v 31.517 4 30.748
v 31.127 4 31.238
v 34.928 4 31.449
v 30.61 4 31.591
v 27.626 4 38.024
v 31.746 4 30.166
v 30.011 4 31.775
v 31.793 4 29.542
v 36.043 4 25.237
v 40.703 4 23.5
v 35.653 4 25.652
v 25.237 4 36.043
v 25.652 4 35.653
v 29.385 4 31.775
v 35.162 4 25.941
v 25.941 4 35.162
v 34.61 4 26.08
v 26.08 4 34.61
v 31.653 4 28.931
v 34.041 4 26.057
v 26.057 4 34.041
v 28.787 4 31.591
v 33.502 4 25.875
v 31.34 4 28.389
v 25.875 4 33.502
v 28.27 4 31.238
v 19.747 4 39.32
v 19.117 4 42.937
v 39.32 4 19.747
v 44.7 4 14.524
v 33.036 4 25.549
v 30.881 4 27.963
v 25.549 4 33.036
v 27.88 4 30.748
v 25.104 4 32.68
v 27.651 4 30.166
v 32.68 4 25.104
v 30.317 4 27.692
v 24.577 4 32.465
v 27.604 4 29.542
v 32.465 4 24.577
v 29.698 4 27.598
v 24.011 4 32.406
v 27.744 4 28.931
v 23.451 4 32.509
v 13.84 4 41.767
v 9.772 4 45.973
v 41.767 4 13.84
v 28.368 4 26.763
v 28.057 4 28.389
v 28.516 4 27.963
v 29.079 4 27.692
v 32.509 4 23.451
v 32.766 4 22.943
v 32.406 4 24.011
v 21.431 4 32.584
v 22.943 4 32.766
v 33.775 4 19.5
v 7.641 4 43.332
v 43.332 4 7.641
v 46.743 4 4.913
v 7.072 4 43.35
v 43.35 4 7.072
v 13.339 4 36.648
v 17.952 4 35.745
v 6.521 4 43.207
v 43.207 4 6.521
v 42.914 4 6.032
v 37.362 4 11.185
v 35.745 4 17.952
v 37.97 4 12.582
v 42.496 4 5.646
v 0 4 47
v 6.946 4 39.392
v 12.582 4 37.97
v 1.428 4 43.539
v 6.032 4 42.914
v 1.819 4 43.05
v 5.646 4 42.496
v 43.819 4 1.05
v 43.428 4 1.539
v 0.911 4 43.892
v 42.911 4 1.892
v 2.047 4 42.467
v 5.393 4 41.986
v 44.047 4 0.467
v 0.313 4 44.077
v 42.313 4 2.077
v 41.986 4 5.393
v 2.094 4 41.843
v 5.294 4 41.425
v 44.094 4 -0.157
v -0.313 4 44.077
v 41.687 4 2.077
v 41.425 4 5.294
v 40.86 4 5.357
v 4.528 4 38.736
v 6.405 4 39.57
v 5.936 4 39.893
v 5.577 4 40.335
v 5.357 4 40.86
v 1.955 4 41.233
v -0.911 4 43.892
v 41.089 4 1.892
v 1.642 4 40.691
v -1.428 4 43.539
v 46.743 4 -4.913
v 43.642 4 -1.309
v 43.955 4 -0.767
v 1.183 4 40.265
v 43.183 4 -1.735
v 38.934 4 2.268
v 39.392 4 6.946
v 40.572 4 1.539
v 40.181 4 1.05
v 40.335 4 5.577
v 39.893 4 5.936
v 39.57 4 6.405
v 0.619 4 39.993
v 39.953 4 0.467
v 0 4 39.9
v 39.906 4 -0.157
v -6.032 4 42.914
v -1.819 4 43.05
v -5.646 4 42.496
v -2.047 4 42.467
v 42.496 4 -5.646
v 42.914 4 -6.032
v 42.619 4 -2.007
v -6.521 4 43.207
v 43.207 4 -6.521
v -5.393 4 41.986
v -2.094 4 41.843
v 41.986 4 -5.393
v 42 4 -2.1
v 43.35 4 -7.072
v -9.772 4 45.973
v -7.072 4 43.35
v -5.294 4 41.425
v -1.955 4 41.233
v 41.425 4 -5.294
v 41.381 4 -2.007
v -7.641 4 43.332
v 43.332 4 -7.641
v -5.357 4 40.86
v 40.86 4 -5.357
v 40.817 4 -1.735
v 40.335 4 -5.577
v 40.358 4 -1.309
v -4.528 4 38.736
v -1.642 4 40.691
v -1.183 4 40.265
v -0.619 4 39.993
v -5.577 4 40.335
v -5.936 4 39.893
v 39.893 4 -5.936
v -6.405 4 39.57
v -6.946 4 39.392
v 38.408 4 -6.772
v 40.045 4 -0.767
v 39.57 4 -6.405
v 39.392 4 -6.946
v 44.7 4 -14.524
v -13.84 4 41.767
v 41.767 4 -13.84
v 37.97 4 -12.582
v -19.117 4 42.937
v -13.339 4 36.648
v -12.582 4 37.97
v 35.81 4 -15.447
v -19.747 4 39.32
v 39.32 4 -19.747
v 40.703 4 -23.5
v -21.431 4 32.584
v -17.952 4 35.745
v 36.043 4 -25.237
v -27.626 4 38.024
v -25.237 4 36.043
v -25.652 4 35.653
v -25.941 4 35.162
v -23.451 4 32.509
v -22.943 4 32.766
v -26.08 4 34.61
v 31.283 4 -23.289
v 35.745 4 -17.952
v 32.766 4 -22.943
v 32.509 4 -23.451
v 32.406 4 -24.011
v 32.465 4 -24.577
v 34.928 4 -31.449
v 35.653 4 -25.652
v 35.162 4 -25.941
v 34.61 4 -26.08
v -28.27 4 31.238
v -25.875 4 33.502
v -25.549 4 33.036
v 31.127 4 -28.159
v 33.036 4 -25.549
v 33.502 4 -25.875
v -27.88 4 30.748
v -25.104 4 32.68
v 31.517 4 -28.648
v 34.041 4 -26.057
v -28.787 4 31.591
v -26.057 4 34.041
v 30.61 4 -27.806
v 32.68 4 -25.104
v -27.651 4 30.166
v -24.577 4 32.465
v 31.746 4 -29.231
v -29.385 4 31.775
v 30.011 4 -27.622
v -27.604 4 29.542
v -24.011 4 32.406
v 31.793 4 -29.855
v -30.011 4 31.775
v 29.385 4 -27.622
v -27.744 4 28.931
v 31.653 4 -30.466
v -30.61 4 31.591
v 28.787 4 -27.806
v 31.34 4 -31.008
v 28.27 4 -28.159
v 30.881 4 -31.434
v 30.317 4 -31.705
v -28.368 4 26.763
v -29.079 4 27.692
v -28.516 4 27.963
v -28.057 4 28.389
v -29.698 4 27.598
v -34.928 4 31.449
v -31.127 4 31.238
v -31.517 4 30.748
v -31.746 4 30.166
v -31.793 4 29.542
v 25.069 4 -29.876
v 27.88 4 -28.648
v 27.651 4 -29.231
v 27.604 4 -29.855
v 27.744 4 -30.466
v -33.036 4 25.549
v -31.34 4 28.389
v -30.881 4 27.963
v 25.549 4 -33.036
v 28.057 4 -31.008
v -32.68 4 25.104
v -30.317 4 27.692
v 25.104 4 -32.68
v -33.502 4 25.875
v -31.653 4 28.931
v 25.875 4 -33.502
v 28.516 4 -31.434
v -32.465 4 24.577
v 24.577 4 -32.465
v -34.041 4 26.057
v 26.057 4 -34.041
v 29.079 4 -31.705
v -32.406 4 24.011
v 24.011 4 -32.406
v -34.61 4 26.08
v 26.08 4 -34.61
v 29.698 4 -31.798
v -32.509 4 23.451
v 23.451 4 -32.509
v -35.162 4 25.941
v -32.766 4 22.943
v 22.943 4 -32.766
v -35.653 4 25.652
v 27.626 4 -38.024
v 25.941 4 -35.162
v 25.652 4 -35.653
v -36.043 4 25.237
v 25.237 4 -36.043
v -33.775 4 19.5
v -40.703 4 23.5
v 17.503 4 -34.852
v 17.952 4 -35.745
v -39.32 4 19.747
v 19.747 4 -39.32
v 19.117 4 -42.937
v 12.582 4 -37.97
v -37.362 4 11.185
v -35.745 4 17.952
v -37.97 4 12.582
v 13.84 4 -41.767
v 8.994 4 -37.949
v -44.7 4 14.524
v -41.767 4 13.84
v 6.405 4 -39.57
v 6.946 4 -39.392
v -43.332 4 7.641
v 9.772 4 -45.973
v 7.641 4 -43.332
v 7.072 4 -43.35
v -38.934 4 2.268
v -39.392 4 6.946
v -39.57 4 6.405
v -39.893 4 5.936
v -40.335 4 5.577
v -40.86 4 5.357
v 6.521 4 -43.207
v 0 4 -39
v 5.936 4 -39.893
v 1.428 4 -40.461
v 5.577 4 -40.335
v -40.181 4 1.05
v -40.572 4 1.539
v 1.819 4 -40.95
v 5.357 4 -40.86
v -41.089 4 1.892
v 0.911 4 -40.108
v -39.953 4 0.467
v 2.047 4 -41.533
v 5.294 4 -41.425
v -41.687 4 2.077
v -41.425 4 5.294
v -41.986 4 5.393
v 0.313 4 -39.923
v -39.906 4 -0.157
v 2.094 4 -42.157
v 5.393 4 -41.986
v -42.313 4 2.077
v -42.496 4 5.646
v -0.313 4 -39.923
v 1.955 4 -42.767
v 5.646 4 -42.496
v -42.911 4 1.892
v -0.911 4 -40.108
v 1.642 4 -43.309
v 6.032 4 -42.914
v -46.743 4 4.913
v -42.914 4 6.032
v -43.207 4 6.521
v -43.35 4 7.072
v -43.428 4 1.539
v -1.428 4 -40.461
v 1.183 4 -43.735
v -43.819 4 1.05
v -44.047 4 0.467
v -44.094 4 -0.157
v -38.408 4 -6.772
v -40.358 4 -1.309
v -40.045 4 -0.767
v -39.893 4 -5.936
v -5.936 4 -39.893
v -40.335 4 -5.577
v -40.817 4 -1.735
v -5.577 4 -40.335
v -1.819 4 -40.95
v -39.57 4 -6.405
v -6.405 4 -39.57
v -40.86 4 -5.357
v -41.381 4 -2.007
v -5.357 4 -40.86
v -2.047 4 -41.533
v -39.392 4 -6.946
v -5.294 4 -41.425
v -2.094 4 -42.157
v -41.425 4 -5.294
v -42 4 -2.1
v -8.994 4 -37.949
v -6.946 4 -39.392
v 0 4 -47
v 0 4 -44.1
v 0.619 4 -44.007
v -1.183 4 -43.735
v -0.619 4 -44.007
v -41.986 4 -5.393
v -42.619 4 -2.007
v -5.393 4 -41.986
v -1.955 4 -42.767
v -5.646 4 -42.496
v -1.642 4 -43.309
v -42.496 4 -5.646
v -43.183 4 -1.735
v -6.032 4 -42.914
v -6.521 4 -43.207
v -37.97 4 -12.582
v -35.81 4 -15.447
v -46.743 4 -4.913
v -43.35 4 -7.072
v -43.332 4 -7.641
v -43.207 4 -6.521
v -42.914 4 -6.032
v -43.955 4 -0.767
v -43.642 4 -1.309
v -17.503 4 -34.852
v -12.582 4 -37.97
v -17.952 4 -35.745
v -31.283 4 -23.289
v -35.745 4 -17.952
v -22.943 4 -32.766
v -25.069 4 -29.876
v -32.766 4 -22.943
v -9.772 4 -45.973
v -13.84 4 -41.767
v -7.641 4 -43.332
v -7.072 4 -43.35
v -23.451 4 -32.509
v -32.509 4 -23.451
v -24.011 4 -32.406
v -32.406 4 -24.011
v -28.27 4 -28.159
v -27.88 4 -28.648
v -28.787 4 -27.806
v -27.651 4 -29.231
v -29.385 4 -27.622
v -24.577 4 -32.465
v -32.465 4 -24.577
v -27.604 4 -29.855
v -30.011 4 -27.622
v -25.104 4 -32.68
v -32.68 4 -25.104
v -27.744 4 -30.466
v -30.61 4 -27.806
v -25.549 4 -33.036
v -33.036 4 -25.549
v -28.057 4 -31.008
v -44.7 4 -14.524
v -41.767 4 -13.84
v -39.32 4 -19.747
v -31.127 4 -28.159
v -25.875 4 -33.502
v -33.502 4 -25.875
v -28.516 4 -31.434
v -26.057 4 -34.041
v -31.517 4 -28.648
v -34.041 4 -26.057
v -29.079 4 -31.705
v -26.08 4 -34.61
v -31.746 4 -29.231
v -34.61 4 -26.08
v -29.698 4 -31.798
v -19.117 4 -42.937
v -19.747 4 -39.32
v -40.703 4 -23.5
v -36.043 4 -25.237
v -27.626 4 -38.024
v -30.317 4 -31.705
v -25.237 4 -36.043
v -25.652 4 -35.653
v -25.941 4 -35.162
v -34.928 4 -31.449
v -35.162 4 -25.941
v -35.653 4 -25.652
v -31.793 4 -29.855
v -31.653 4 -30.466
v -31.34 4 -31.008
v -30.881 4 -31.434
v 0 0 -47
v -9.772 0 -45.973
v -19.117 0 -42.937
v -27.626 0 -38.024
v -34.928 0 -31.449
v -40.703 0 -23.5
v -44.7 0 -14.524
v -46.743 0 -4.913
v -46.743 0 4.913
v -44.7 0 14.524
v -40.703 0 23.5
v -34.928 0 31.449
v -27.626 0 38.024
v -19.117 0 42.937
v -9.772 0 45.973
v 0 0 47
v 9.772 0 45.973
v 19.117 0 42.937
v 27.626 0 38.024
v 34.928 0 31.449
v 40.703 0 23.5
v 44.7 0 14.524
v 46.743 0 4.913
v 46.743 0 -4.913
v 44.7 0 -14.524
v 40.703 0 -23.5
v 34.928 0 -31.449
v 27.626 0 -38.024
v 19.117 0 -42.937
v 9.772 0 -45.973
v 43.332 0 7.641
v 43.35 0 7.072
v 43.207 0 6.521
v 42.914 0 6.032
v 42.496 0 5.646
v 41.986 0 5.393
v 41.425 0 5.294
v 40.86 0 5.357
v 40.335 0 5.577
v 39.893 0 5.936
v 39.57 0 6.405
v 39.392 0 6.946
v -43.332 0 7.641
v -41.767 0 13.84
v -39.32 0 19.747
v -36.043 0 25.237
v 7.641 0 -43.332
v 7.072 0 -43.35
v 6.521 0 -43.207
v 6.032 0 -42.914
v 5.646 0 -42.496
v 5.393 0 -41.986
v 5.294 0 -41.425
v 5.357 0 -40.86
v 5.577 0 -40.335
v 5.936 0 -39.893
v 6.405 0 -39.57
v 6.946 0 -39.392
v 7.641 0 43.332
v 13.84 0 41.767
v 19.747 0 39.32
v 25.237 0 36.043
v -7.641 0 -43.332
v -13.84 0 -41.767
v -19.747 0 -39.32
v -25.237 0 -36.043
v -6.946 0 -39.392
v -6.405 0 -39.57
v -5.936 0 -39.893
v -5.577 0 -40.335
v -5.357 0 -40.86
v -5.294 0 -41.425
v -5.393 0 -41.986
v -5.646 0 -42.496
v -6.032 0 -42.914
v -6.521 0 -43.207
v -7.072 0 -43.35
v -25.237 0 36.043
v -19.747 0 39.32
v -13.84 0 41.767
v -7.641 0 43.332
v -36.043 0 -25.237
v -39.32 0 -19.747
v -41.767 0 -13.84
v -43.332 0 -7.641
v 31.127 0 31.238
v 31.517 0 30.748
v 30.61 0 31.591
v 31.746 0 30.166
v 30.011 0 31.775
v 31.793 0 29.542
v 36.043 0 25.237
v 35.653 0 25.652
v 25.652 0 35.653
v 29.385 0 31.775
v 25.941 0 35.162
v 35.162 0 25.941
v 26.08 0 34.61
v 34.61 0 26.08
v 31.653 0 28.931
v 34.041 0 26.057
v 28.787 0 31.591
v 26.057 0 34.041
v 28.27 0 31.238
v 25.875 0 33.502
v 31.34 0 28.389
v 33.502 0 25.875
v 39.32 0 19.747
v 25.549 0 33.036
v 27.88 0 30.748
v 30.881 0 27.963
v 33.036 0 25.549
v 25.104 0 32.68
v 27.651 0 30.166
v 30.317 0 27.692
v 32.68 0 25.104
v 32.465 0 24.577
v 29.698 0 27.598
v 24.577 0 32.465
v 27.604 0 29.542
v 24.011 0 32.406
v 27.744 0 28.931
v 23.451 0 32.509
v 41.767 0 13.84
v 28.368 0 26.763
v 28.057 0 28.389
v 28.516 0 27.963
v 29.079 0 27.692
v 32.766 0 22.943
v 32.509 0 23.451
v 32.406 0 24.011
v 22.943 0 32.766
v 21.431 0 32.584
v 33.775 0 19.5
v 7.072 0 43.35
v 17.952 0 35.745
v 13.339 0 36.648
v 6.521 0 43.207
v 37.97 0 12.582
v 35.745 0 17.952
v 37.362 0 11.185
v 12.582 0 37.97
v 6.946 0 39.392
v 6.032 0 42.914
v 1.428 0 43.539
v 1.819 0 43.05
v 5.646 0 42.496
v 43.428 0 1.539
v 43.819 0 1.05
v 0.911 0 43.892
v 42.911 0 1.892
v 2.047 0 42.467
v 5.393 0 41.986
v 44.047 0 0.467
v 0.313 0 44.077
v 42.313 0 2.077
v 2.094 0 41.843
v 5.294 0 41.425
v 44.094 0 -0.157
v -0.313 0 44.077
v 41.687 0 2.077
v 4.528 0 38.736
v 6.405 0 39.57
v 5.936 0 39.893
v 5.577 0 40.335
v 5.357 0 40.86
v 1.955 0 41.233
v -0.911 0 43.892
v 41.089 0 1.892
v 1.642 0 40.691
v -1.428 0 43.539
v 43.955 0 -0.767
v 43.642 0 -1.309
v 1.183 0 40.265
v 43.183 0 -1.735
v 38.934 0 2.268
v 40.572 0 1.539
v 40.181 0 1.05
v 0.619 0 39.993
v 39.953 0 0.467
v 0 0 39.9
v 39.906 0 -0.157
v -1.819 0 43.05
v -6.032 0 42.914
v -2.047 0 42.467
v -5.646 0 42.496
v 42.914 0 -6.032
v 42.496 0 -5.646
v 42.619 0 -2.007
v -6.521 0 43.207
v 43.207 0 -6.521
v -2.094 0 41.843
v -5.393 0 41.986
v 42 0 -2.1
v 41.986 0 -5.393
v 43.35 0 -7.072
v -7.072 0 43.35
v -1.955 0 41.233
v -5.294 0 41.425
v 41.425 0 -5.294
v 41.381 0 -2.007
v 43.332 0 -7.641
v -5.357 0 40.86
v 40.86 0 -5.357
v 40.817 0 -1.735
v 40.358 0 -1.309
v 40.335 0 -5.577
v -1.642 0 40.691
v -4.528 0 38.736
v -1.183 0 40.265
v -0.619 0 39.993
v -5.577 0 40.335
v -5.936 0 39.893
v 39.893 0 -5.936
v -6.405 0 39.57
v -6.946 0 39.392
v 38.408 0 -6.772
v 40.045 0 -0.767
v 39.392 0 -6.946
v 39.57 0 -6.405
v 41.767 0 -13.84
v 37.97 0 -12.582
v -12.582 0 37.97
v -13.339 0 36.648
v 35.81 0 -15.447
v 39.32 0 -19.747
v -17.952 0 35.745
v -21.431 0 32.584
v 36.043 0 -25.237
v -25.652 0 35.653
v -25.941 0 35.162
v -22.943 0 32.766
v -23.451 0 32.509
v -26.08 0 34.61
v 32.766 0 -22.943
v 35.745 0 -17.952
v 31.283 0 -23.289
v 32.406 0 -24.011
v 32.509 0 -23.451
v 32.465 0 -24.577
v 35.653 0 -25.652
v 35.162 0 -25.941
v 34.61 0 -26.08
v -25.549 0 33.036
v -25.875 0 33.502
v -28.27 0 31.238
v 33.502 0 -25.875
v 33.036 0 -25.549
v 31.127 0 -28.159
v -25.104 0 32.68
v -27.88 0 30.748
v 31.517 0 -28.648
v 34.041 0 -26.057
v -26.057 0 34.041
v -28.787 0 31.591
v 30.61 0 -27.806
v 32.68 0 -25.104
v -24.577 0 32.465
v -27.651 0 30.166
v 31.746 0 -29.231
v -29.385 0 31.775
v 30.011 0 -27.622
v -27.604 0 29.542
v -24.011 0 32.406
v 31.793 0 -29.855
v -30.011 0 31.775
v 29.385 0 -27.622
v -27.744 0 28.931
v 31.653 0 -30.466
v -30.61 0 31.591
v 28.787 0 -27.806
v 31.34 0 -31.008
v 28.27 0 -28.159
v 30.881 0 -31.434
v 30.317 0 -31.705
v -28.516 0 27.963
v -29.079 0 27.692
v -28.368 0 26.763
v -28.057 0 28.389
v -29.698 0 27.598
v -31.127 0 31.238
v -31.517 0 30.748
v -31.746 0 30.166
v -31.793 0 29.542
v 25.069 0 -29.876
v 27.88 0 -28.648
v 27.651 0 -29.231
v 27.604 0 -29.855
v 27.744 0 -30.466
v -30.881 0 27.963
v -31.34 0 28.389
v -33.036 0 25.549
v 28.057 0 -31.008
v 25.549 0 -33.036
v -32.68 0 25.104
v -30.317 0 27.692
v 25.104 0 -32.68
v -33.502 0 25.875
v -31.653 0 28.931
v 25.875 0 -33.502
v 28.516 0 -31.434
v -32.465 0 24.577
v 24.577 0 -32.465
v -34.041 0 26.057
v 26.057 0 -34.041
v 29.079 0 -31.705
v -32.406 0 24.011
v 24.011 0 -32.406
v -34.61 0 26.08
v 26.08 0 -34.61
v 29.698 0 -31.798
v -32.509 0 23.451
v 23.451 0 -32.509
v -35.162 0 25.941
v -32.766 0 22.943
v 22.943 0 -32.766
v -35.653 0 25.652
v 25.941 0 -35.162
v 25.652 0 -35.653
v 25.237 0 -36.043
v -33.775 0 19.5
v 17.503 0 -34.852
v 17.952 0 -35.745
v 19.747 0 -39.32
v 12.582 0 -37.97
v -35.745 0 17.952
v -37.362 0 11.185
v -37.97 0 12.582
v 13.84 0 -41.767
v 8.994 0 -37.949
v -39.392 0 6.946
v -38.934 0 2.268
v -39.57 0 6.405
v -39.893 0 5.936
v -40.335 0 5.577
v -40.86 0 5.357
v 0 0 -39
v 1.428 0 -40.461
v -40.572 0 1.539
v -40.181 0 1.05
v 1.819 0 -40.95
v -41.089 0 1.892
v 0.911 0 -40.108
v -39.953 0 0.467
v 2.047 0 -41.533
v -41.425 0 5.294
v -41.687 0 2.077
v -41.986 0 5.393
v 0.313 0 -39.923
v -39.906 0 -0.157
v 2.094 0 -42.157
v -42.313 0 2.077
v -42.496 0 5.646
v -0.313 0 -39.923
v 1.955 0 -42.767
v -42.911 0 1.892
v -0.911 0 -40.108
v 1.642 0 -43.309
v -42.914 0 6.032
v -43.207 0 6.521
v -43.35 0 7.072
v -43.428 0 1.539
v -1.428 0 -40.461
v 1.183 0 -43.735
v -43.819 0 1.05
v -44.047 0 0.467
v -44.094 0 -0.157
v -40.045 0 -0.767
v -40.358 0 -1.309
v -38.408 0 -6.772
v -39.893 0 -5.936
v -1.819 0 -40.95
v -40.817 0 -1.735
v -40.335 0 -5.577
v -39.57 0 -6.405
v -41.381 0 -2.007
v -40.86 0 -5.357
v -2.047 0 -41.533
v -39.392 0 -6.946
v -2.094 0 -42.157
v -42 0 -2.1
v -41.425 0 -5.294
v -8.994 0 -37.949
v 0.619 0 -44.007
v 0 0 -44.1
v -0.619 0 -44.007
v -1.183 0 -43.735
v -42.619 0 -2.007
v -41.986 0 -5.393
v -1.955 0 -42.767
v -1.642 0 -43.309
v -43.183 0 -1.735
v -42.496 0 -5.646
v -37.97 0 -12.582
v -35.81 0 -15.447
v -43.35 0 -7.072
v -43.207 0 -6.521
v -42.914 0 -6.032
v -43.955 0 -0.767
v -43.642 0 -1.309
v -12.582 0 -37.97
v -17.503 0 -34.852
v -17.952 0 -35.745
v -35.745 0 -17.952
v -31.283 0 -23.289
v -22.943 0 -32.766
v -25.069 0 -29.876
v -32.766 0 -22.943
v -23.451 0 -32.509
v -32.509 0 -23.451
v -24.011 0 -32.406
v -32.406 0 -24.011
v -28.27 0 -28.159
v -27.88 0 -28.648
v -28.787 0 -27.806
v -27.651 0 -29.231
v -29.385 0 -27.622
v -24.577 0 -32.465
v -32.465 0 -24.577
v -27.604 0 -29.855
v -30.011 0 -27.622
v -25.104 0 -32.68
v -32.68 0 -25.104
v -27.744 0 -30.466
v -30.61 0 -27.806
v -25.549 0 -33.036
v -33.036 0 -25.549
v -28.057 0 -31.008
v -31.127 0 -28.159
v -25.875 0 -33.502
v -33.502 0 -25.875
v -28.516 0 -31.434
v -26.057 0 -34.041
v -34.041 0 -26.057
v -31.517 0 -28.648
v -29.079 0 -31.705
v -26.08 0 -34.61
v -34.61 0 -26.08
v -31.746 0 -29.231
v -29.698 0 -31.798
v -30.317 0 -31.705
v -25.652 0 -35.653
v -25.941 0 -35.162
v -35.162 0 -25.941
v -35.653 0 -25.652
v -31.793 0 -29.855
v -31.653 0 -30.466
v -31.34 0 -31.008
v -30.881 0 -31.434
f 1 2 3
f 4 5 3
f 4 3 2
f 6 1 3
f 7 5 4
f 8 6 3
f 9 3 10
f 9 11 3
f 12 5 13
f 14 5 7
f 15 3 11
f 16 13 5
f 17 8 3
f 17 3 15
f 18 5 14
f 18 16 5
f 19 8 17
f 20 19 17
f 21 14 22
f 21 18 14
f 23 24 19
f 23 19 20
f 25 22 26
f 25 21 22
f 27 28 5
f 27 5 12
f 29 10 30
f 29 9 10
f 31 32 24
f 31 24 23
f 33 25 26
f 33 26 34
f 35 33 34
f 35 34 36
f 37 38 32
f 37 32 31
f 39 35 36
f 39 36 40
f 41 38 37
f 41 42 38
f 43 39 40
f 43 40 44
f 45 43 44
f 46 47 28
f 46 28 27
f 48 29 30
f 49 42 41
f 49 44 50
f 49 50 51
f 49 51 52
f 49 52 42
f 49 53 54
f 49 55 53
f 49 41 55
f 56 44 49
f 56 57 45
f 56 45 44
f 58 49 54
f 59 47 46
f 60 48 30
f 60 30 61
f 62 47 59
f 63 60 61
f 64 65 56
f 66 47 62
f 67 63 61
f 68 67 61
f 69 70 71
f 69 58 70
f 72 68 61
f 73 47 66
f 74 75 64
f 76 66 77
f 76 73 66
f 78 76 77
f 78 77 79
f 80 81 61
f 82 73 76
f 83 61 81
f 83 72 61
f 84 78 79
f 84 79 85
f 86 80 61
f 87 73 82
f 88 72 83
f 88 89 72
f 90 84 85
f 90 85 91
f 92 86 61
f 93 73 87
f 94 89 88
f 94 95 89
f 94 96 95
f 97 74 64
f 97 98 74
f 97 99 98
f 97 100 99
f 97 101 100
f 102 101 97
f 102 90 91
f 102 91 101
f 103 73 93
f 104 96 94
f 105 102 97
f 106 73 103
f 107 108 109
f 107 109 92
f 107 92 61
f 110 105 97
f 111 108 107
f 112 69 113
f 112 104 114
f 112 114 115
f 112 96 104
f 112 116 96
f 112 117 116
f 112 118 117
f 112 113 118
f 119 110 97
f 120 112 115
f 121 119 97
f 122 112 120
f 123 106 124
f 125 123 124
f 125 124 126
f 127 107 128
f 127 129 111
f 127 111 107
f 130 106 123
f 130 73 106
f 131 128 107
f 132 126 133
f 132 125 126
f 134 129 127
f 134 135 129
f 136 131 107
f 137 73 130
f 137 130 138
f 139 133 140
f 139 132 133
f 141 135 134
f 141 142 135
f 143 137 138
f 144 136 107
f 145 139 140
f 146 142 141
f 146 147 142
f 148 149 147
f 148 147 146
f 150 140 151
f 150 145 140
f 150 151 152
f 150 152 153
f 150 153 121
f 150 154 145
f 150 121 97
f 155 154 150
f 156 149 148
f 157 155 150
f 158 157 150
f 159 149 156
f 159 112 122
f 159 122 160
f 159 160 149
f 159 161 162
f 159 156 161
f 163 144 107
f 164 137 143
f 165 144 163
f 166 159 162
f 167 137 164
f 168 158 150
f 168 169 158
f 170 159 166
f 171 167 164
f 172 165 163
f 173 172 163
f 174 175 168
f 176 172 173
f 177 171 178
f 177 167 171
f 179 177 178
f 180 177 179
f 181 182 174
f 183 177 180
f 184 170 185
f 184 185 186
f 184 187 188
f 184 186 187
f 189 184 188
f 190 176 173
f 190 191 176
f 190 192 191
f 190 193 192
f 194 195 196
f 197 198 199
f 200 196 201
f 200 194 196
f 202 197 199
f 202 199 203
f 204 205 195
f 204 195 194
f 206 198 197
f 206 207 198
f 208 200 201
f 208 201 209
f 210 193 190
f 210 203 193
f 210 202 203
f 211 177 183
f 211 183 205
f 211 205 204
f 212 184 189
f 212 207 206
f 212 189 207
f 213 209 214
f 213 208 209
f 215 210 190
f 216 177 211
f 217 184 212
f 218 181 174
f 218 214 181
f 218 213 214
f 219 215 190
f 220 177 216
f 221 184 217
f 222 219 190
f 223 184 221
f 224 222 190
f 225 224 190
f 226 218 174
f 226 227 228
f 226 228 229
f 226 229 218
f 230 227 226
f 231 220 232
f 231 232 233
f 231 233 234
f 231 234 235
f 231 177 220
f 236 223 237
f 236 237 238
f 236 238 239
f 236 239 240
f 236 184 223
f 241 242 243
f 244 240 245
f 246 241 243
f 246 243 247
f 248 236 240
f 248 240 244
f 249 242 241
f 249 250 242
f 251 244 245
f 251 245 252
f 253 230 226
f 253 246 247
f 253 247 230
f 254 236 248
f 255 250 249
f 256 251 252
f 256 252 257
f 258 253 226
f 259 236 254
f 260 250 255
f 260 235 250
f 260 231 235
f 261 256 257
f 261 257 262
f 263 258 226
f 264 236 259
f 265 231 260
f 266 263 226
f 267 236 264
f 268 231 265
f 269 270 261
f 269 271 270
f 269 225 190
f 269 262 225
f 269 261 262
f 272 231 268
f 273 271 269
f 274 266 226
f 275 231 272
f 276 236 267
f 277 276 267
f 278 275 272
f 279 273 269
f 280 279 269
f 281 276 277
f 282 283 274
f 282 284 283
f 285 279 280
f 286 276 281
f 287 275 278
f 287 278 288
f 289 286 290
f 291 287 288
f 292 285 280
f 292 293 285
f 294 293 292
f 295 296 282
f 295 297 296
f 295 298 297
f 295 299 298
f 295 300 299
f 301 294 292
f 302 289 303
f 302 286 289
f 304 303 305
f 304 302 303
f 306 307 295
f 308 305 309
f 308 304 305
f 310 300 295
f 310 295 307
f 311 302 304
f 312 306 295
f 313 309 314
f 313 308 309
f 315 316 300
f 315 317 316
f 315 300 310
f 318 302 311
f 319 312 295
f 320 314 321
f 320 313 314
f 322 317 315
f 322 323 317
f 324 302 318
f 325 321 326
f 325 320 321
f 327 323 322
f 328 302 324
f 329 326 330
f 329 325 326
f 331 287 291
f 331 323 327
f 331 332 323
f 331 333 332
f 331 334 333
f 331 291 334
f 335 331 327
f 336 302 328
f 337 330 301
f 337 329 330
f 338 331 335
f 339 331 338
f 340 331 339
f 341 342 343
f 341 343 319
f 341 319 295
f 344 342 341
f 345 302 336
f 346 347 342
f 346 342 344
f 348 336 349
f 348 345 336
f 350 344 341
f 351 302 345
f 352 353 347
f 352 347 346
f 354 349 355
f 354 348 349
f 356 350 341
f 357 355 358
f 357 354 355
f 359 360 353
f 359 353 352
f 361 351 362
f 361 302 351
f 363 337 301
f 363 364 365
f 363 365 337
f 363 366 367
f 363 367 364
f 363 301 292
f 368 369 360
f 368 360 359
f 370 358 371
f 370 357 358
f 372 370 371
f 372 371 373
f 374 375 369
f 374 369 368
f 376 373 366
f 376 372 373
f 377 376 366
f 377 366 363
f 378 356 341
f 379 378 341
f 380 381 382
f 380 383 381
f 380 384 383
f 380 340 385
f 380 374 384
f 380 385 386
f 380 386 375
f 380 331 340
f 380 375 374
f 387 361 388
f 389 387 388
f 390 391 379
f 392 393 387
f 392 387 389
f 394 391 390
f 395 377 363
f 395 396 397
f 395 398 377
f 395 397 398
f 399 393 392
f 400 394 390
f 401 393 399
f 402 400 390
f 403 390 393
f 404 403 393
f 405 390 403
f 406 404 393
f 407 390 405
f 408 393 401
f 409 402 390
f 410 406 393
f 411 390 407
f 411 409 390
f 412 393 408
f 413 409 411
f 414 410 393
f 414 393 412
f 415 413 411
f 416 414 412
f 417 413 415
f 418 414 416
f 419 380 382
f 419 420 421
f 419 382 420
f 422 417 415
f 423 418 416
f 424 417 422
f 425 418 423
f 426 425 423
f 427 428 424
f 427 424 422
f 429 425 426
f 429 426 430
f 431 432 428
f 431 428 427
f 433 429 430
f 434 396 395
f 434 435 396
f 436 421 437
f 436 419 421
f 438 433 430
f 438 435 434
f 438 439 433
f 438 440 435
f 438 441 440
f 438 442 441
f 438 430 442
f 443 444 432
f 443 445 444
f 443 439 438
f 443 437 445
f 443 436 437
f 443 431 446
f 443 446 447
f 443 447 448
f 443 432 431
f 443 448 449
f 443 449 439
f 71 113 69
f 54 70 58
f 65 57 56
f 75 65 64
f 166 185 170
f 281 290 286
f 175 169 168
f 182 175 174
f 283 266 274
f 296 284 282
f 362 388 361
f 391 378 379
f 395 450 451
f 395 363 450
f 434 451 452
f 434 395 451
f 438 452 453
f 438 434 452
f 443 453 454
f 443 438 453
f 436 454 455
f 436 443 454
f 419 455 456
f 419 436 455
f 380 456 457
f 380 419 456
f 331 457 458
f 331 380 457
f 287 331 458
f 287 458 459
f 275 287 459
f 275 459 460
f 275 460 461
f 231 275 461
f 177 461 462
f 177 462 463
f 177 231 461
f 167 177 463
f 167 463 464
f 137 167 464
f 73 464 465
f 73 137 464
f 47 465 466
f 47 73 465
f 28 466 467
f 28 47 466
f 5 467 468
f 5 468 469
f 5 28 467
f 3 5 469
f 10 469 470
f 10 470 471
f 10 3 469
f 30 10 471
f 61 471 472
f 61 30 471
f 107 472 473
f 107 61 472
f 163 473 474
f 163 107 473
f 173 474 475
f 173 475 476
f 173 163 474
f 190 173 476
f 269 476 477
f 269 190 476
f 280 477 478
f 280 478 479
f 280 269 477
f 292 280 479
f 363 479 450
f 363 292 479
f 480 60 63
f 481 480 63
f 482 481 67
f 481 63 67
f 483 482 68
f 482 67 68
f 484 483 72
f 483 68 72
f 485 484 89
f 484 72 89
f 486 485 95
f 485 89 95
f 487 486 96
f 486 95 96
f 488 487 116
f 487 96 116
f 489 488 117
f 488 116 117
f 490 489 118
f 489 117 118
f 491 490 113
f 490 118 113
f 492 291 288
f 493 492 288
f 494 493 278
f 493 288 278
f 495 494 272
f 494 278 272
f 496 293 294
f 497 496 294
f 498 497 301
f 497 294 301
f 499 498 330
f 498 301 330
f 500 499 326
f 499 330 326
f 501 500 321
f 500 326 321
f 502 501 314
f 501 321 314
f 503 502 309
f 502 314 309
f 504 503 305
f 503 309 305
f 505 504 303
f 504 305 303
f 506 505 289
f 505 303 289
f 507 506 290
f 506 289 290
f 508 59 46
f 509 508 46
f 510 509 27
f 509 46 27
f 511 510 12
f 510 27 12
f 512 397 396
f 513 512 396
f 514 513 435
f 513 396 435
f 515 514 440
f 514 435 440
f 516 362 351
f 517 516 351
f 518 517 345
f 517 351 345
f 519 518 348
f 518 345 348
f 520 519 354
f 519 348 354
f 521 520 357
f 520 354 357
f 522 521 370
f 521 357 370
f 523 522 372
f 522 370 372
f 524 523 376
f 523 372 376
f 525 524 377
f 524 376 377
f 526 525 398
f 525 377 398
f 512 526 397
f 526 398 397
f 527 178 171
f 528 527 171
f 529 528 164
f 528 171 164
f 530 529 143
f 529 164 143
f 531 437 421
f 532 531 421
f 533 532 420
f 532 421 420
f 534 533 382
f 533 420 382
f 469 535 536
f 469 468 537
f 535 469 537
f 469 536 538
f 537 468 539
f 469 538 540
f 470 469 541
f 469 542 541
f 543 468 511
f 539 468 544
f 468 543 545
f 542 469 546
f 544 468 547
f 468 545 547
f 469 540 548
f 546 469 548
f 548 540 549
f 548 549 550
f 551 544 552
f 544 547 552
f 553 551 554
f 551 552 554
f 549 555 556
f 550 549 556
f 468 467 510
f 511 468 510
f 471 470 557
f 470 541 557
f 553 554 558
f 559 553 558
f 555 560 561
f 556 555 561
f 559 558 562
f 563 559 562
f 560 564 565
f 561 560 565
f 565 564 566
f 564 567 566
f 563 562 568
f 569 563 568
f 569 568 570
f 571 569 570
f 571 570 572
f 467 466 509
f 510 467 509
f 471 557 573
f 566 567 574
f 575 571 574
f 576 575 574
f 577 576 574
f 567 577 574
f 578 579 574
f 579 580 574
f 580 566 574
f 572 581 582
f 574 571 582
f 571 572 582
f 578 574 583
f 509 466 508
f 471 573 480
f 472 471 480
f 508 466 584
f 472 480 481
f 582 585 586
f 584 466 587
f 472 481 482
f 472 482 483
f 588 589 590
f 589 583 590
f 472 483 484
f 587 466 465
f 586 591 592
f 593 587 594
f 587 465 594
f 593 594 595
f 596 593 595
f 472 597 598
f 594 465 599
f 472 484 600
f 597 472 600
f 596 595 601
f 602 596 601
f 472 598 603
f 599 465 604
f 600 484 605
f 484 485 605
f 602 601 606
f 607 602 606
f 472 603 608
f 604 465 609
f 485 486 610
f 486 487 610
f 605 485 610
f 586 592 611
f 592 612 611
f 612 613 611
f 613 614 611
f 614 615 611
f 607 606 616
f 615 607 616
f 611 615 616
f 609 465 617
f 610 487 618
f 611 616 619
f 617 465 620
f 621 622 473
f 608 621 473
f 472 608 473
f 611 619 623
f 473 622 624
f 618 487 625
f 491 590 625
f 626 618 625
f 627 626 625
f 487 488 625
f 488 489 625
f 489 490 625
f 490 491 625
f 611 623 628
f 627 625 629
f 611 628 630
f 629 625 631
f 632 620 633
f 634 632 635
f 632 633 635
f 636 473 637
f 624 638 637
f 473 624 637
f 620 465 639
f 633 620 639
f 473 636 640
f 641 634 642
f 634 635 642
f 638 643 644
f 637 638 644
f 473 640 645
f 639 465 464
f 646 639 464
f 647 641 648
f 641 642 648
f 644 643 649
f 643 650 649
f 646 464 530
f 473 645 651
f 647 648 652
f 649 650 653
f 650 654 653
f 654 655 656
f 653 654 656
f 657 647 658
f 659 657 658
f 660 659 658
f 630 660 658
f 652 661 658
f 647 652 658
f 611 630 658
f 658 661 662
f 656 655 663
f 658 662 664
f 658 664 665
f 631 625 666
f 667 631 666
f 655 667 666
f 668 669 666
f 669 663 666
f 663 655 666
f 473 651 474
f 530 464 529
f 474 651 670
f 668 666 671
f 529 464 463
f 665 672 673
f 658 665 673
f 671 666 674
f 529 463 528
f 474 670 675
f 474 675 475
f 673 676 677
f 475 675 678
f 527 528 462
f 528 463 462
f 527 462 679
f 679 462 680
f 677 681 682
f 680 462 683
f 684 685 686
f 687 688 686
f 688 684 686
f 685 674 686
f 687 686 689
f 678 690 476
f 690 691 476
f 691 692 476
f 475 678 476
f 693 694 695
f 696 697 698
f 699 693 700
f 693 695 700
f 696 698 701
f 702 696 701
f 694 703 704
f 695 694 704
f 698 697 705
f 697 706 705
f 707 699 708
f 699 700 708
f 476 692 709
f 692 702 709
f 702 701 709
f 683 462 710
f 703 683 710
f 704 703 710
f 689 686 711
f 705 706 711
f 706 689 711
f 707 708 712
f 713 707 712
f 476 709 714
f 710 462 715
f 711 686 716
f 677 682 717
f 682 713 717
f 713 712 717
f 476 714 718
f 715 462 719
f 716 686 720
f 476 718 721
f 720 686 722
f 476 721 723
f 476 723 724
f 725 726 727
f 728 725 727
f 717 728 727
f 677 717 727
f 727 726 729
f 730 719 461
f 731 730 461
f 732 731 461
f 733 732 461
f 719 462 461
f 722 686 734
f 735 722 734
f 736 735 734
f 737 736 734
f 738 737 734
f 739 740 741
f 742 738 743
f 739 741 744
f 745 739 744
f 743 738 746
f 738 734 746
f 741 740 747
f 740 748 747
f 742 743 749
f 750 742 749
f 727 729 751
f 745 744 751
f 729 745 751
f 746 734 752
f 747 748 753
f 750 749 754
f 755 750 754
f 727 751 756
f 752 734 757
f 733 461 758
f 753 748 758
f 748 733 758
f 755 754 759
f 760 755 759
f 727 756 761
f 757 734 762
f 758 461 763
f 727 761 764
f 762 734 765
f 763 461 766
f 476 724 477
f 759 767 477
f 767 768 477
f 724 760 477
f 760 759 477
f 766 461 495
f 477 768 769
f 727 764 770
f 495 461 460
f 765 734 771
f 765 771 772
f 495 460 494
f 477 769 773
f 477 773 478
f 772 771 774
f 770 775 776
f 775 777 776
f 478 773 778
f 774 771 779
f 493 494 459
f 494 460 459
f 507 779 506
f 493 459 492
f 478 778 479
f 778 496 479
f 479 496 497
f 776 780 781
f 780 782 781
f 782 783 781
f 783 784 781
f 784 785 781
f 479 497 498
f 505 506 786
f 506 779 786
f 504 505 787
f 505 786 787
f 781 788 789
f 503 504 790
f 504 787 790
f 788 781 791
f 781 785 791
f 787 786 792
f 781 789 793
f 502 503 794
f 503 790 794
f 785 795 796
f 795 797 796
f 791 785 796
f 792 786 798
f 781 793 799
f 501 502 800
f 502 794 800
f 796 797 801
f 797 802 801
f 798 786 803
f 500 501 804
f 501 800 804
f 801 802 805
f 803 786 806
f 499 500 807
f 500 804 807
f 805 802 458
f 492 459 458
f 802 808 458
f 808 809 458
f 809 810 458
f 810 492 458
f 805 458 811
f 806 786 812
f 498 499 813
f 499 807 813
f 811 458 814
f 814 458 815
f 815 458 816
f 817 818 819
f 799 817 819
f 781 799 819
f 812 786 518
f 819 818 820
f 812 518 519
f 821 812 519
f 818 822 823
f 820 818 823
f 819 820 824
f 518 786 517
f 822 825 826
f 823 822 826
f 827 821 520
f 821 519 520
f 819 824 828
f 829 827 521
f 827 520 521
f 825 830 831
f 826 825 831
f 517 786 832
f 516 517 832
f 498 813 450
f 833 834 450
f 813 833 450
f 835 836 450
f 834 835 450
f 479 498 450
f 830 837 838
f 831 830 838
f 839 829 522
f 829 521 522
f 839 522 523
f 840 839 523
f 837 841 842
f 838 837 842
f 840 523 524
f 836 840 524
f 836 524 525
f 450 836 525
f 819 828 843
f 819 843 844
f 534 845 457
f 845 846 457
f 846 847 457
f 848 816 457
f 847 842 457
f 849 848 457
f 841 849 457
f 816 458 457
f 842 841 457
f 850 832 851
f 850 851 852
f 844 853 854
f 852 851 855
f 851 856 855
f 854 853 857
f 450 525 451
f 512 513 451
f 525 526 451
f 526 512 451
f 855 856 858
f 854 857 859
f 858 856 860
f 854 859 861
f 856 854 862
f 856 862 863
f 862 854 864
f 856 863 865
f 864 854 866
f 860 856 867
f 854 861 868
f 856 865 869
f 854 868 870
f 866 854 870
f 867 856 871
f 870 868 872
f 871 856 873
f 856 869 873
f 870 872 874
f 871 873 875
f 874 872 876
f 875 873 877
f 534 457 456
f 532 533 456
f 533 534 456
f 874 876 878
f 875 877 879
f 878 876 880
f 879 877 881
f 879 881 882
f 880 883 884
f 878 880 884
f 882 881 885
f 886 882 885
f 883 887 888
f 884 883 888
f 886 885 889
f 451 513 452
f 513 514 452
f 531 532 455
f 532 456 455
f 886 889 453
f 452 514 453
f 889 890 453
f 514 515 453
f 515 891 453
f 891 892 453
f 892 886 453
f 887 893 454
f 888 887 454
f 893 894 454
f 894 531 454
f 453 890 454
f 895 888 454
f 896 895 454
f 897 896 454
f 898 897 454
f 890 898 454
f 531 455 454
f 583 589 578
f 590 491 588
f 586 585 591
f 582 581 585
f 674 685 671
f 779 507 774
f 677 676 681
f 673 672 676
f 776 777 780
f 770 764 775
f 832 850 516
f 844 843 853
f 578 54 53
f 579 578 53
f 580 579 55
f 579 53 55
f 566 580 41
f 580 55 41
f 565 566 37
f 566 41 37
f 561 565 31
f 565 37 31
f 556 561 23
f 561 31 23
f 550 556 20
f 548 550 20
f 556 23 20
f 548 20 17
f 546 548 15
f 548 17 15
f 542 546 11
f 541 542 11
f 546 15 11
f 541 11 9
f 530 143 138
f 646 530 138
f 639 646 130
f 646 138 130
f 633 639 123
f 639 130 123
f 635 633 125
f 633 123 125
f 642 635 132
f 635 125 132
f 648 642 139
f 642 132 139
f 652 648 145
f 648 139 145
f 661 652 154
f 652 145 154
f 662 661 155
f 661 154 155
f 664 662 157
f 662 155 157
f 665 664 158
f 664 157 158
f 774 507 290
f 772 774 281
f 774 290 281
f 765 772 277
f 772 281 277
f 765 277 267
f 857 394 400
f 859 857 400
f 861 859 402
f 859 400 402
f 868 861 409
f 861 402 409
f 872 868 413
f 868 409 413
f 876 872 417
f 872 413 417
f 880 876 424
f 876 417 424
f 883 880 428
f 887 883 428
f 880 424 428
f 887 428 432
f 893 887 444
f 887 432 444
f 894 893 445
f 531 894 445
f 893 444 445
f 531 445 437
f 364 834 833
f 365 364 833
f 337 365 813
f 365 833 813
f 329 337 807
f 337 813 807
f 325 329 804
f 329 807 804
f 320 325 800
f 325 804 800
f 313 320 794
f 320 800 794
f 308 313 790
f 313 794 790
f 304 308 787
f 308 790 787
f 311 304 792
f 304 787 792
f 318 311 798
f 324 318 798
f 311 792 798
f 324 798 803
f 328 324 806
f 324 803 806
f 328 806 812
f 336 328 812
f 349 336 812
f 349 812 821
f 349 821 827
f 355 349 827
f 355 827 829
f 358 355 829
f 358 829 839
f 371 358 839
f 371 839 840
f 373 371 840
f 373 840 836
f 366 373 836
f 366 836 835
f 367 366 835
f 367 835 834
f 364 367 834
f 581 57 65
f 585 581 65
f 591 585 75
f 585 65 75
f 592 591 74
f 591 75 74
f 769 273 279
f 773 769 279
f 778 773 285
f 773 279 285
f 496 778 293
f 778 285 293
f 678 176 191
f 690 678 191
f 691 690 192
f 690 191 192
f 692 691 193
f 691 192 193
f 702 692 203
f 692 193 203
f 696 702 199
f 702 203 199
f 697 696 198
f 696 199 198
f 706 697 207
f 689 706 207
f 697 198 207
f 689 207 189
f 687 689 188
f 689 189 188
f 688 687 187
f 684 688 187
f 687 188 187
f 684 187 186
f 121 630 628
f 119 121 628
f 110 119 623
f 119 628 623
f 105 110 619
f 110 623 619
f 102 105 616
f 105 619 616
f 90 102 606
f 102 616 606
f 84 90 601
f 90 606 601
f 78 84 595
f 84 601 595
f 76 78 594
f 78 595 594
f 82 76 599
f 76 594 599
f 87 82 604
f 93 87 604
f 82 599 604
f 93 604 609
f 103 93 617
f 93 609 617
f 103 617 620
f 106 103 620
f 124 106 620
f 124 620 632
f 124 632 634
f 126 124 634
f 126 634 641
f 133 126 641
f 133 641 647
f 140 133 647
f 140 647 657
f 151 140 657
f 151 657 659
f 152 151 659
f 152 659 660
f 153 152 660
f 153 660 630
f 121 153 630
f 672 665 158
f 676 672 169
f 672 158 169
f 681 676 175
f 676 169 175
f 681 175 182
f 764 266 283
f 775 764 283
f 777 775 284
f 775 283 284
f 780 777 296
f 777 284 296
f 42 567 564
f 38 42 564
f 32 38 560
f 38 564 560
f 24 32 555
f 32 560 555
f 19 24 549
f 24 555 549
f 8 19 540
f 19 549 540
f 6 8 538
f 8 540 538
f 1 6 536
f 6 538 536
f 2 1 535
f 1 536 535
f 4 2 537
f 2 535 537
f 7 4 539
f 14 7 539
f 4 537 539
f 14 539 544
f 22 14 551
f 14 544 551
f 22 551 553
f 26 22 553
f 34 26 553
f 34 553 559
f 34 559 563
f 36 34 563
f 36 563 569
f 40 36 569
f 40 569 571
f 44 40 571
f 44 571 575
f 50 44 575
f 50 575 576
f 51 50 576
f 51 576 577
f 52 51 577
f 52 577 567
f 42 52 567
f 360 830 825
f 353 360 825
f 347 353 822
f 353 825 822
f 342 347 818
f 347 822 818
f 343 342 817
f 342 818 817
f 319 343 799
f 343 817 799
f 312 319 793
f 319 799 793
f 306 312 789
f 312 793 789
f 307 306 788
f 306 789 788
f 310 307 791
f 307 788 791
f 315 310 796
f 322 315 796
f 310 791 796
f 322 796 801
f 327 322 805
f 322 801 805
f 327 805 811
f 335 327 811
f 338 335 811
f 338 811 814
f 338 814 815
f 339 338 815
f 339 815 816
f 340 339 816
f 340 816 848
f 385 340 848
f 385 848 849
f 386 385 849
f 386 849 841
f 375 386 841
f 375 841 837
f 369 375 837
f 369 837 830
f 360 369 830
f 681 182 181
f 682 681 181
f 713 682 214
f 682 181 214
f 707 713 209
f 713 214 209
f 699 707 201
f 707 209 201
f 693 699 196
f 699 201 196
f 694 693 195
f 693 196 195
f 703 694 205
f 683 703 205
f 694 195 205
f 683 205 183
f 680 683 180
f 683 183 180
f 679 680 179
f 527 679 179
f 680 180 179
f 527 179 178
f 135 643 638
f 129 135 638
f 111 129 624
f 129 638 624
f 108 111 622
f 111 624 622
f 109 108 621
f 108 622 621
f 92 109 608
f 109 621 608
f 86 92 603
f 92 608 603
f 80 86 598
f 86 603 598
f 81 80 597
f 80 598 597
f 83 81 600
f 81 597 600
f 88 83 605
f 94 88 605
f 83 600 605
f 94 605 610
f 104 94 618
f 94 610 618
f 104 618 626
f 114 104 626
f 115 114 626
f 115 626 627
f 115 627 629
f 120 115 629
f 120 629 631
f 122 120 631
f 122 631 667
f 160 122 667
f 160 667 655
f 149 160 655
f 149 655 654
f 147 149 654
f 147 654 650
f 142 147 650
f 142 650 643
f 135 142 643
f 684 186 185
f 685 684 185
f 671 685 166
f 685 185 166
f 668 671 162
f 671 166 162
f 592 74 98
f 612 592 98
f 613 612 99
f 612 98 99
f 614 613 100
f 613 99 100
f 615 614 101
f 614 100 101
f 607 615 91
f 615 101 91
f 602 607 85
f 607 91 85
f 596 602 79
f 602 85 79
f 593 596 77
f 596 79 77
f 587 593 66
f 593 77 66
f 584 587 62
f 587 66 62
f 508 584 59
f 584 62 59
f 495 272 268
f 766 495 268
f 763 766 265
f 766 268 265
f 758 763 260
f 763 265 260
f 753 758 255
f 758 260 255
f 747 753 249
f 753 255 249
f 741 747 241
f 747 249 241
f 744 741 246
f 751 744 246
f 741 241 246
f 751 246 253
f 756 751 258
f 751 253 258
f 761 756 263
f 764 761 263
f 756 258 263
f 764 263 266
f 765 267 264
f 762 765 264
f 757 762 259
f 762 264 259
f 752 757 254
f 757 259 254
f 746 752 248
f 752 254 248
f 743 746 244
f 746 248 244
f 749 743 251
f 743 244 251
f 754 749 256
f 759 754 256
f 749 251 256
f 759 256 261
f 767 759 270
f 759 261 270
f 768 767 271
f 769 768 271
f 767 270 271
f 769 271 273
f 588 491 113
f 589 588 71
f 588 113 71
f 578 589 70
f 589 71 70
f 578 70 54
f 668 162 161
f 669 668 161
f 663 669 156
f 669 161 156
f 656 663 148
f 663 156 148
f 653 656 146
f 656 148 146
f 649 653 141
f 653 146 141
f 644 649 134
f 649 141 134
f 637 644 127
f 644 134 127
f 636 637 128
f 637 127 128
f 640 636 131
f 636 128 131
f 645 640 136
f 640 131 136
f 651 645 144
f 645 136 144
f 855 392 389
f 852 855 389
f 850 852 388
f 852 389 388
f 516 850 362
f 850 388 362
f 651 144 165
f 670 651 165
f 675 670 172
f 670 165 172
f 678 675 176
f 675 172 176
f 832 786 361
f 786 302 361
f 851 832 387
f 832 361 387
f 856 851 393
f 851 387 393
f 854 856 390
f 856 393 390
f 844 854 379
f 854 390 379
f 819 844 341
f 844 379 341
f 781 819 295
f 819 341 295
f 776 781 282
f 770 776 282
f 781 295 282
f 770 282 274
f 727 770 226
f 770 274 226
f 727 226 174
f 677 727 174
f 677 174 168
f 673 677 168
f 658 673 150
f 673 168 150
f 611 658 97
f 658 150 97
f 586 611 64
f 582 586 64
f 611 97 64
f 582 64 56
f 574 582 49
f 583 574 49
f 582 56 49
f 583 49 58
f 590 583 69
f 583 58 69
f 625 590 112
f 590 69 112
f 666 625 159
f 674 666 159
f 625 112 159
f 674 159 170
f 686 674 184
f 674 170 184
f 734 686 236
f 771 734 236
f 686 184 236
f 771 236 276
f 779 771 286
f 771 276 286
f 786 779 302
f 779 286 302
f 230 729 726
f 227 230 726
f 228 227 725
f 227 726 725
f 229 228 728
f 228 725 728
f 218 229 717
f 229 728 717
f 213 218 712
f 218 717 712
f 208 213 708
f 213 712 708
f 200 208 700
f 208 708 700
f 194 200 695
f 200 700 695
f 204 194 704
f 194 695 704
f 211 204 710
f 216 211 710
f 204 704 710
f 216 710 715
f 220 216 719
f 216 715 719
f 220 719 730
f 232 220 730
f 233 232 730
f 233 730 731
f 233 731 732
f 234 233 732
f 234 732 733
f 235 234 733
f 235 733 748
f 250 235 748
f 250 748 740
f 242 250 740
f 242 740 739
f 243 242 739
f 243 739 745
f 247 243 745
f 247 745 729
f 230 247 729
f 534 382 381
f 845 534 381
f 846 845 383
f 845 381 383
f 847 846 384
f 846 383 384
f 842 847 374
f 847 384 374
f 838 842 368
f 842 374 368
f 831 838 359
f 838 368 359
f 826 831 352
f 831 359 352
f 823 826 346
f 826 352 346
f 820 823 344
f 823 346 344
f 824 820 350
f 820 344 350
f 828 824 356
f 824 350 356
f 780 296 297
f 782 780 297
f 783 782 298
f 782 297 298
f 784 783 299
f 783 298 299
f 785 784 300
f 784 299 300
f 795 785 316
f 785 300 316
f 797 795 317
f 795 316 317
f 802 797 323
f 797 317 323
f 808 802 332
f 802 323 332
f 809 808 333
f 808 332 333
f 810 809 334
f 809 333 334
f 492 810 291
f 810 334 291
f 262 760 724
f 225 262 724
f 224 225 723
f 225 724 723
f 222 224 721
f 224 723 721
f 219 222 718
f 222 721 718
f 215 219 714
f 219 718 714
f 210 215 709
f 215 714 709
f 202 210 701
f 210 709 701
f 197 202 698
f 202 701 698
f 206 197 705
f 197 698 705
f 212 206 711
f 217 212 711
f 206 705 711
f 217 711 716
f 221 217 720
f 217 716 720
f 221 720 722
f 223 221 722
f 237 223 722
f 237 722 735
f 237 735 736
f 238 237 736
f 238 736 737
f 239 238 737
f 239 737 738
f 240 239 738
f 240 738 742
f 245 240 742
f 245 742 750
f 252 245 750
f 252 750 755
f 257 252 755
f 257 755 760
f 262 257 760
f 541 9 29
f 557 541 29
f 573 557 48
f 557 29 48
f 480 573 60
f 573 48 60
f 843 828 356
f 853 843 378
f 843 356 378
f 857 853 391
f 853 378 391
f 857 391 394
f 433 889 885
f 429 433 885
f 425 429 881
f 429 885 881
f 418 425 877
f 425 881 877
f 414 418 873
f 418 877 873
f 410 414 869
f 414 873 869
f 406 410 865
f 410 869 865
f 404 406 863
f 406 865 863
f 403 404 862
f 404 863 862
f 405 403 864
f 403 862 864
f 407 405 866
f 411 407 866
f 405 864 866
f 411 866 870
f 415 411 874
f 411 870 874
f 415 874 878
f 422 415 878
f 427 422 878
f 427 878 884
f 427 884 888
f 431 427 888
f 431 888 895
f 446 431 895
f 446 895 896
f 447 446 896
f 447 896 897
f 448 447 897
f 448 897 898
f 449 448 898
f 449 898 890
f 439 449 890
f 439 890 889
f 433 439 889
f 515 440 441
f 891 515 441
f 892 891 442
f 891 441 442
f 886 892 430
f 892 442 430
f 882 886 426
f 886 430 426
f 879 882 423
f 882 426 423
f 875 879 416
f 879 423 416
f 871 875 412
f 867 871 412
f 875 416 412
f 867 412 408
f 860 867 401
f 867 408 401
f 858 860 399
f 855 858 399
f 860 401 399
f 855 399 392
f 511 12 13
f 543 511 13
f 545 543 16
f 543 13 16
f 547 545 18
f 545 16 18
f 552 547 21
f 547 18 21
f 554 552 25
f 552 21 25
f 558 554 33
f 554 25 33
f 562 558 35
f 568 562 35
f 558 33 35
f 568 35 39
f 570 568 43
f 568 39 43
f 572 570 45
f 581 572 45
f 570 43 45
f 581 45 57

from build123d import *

# Parameters (mm, degrees)
SKETCH_1_W          = 8
SKETCH_1_H          = 4
SKETCH_2_R          = 2.1
CUT_EXTRUDE_1_DEPTH = 10
CUT_EXTRUDE_2_DEPTH = 67.588287258


with BuildPart() as part:
    # 草图1 → 旋转1 (revolve)
    with BuildSketch(Plane.XY, mode=Mode.PRIVATE) as revolve_1_sk:
        with Locations((-43, 2)):
            Rectangle(SKETCH_1_W, SKETCH_1_H)
    revolve(revolve_1_sk.sketch.rotate(Axis((0, 0, 0), (0, 1, 0)), 270), axis=Axis((0, 0, 0), (0, 1, 0)))

    # 草图2 → 切除-拉伸1 (cut)
    with BuildSketch(Plane.XZ):
        with Locations(Location((0, 42, 0), (0, 0, 270))):
            Circle(SKETCH_2_R)
        with Locations(Location((29.69848481, 29.69848481, 0), (0, 0, 270))):
            Circle(SKETCH_2_R)
        with Locations(Location((42, 0, 0), (0, 0, 270))):
            Circle(SKETCH_2_R)
        with Locations(Location((29.69848481, -29.69848481, 0), (0, 0, 270))):
            Circle(SKETCH_2_R)
        with Locations(Location((0, -42, 0), (0, 0, 270))):
            Circle(SKETCH_2_R)
        with Locations(Location((-29.69848481, -29.69848481, 0), (0, 0, 270))):
            Circle(SKETCH_2_R)
        with Locations(Location((-42, 0, 0), (0, 0, 270))):
            Circle(SKETCH_2_R)
        with Locations(Location((-29.69848481, 29.69848481, 0), (0, 0, 270))):
            Circle(SKETCH_2_R)
    extrude(amount=-CUT_EXTRUDE_1_DEPTH, mode=Mode.SUBTRACT)

    # 草图3 → 切除-拉伸2 (cut, through all)
    with BuildSketch(Plane(origin=(0, 4, 0), x_dir=(1, 0, 0), z_dir=(0, 1, 0))):
        with BuildLine():
            ThreePointArc((25.237363199, 36.042689949), (16.838071024, 40.65069943), (7.640519817, 43.331541133))
            ThreePointArc((7.640519817, 43.331541133), (5.323607956, 41.709221982), (6.945927107, 39.39231012))
            ThreePointArc((6.945927107, 39.39231012), (15.307337295, 36.9551813), (22.943057454, 32.766081772))
            ThreePointArc((22.943057454, 32.766081772), (25.728514415, 33.257232987), (25.237363199, 36.042689949))
        make_face()
        with BuildLine():
            ThreePointArc((43.331541133, 7.640519817), (40.65069943, 16.838071024), (36.042689949, 25.237363199))
            ThreePointArc((36.042689949, 25.237363199), (33.257232987, 25.728514415), (32.766081772, 22.943057454))
            ThreePointArc((32.766081772, 22.943057454), (36.9551813, 15.307337295), (39.39231012, 6.945927107))
            ThreePointArc((39.39231012, 6.945927107), (41.709221982, 5.323607956), (43.331541133, 7.640519817))
        make_face()
        with BuildLine():
            ThreePointArc((36.042689949, -25.237363199), (40.65069943, -16.838071024), (43.331541133, -7.640519817))
            ThreePointArc((43.331541133, -7.640519817), (41.709221982, -5.323607956), (39.39231012, -6.945927107))
            ThreePointArc((39.39231012, -6.945927107), (36.9551813, -15.307337295), (32.766081772, -22.943057454))
            ThreePointArc((32.766081772, -22.943057454), (33.257232987, -25.728514415), (36.042689949, -25.237363199))
        make_face()
        with BuildLine():
            ThreePointArc((7.640519817, -43.331541133), (16.838071024, -40.65069943), (25.237363199, -36.042689949))
            ThreePointArc((25.237363199, -36.042689949), (25.728514415, -33.257232987), (22.943057454, -32.766081772))
            ThreePointArc((22.943057454, -32.766081772), (15.307337295, -36.9551813), (6.945927107, -39.39231012))
            ThreePointArc((6.945927107, -39.39231012), (5.323607956, -41.709221982), (7.640519817, -43.331541133))
        make_face()
        with BuildLine():
            ThreePointArc((-25.237363199, -36.042689949), (-16.838071024, -40.65069943), (-7.640519817, -43.331541133))
            ThreePointArc((-7.640519817, -43.331541133), (-5.323607956, -41.709221982), (-6.945927107, -39.39231012))
            ThreePointArc((-6.945927107, -39.39231012), (-15.307337295, -36.9551813), (-22.943057454, -32.766081772))
            ThreePointArc((-22.943057454, -32.766081772), (-25.728514415, -33.257232987), (-25.237363199, -36.042689949))
        make_face()
        with BuildLine():
            ThreePointArc((-43.331541133, -7.640519817), (-40.65069943, -16.838071024), (-36.042689949, -25.237363199))
            ThreePointArc((-36.042689949, -25.237363199), (-33.257232987, -25.728514415), (-32.766081772, -22.943057454))
            ThreePointArc((-32.766081772, -22.943057454), (-36.9551813, -15.307337295), (-39.39231012, -6.945927107))
            ThreePointArc((-39.39231012, -6.945927107), (-41.709221982, -5.323607956), (-43.331541133, -7.640519817))
        make_face()
        with BuildLine():
            ThreePointArc((-36.042689949, 25.237363199), (-40.65069943, 16.838071024), (-43.331541133, 7.640519817))
            ThreePointArc((-43.331541133, 7.640519817), (-41.709221982, 5.323607956), (-39.39231012, 6.945927107))
            ThreePointArc((-39.39231012, 6.945927107), (-36.9551813, 15.307337295), (-32.766081772, 22.943057454))
            ThreePointArc((-32.766081772, 22.943057454), (-33.257232987, 25.728514415), (-36.042689949, 25.237363199))
        make_face()
        with BuildLine():
            ThreePointArc((-7.640519817, 43.331541133), (-16.838071024, 40.65069943), (-25.237363199, 36.042689949))
            ThreePointArc((-25.237363199, 36.042689949), (-25.728514415, 33.257232987), (-22.943057454, 32.766081772))
            ThreePointArc((-22.943057454, 32.766081772), (-15.307337295, 36.9551813), (-6.945927107, 39.39231012))
            ThreePointArc((-6.945927107, 39.39231012), (-5.323607956, 41.709221982), (-7.640519817, 43.331541133))
        make_face()
    extrude(amount=-CUT_EXTRUDE_2_DEPTH, mode=Mode.SUBTRACT)


solid = part.part
